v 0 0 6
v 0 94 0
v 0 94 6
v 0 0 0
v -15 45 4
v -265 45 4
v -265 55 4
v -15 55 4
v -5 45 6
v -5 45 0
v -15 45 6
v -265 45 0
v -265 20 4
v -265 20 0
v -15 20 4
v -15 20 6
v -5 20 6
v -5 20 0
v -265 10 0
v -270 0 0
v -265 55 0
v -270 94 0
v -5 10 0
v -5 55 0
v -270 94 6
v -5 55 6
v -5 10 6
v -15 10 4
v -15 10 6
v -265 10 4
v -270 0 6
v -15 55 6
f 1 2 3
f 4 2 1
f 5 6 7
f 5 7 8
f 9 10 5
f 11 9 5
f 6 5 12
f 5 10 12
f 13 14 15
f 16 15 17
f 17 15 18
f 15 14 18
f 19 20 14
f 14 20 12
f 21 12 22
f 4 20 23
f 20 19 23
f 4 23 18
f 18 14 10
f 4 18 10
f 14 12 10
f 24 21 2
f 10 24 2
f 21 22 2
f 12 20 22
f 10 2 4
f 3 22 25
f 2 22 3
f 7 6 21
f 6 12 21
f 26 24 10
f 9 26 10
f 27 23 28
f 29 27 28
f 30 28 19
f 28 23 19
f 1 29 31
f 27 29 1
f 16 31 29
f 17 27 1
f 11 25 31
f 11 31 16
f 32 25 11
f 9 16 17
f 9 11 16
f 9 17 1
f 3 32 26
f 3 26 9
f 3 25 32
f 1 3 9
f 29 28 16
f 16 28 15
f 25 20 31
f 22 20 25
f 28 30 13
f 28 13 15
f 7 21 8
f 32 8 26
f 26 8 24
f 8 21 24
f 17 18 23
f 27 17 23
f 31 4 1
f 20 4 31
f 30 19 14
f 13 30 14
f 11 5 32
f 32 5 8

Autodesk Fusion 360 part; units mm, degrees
sketch "Sorted Smarties Top" plane through (0, 0, 0) normal (0, 0, 1) x (1, 0, 0)
  line L0 (0, 0) -> (-270, 0)
  line L1 (-270, 0) -> (-270, 94)
  line L2 (-270, 94) -> (0, 94)
  line L3 (0, 94) -> (0, 0)
  dimension "d2" = 270
  dimension "d3" = 94
extrude "Extrude1" add sketch "Sorted Smarties Top" along normal blind 6
sketch "Sketch2" plane through (0, 0, 0) normal (0, 0, -1) x (1, 0, 0)
  line L0 (-270, -94) -> (0, -94)
  line L1 (0, -94) -> (0, 0)
  line L2 (0, 0) -> (-270, 0)
  line L3 (-270, 0) -> (-270, -94)
  line L4 (-5, -10) -> (-265, -10)
  line L5 (-265, -10) -> (-265, -20)
  line L6 (-265, -20) -> (-5, -20)
  line L7 (-5, -20) -> (-5, -10)
  line L8 (-5, -45) -> (-265, -45)
  line L9 (-265, -45) -> (-265, -55)
  line L10 (-265, -55) -> (-5, -55)
  line L11 (-5, -55) -> (-5, -45)
  dimension "d6" = 10
  dimension "d7" = 10
  dimension "d8" = 10
  dimension "d9" = 25
  dimension "d10" = 5
  dimension "d11" = 5
  dimension "d12" = 5
  dimension "d13" = 5
extrude "Extrude2" cut sketch "Sketch2" against normal blind 4 contours L4 L5 L6 L7 | L8 L9 L10 L11
sketch "Sketch3" plane through (0, 0, 4) normal (0, 0, -1) x (1, 0, 0)
  line L0 (-5, -20) -> (-5, -10)
  line L1 (-5, -10) -> (-265, -10)
  line L2 (-265, -10) -> (-265, -20)
  line L3 (-265, -20) -> (-5, -20)
  line L4 (-5, -10) -> (-15, -10)
  line L5 (-15, -10) -> (-15, -20)
  line L6 (-15, -20) -> (-5, -20)
  line L7 (-5, -20) -> (-5, -10)
  line L8 (-5, -45) -> (-15, -45)
  line L9 (-15, -45) -> (-15, -55)
  line L10 (-15, -55) -> (-5, -55)
  line L11 (-5, -55) -> (-5, -45)
extrude "Extrude3" cut sketch "Sketch3" against normal blind 2 contours L0 L1 L3 L4 L5 L6 L7 | L8 L9 L10 L11
equation "MDFThickness = 6 mm" comment "Thickness of the MDF board."
equation "d3 = 100 mm - MDFThickness"
equation "d4 = MDFThickness"
